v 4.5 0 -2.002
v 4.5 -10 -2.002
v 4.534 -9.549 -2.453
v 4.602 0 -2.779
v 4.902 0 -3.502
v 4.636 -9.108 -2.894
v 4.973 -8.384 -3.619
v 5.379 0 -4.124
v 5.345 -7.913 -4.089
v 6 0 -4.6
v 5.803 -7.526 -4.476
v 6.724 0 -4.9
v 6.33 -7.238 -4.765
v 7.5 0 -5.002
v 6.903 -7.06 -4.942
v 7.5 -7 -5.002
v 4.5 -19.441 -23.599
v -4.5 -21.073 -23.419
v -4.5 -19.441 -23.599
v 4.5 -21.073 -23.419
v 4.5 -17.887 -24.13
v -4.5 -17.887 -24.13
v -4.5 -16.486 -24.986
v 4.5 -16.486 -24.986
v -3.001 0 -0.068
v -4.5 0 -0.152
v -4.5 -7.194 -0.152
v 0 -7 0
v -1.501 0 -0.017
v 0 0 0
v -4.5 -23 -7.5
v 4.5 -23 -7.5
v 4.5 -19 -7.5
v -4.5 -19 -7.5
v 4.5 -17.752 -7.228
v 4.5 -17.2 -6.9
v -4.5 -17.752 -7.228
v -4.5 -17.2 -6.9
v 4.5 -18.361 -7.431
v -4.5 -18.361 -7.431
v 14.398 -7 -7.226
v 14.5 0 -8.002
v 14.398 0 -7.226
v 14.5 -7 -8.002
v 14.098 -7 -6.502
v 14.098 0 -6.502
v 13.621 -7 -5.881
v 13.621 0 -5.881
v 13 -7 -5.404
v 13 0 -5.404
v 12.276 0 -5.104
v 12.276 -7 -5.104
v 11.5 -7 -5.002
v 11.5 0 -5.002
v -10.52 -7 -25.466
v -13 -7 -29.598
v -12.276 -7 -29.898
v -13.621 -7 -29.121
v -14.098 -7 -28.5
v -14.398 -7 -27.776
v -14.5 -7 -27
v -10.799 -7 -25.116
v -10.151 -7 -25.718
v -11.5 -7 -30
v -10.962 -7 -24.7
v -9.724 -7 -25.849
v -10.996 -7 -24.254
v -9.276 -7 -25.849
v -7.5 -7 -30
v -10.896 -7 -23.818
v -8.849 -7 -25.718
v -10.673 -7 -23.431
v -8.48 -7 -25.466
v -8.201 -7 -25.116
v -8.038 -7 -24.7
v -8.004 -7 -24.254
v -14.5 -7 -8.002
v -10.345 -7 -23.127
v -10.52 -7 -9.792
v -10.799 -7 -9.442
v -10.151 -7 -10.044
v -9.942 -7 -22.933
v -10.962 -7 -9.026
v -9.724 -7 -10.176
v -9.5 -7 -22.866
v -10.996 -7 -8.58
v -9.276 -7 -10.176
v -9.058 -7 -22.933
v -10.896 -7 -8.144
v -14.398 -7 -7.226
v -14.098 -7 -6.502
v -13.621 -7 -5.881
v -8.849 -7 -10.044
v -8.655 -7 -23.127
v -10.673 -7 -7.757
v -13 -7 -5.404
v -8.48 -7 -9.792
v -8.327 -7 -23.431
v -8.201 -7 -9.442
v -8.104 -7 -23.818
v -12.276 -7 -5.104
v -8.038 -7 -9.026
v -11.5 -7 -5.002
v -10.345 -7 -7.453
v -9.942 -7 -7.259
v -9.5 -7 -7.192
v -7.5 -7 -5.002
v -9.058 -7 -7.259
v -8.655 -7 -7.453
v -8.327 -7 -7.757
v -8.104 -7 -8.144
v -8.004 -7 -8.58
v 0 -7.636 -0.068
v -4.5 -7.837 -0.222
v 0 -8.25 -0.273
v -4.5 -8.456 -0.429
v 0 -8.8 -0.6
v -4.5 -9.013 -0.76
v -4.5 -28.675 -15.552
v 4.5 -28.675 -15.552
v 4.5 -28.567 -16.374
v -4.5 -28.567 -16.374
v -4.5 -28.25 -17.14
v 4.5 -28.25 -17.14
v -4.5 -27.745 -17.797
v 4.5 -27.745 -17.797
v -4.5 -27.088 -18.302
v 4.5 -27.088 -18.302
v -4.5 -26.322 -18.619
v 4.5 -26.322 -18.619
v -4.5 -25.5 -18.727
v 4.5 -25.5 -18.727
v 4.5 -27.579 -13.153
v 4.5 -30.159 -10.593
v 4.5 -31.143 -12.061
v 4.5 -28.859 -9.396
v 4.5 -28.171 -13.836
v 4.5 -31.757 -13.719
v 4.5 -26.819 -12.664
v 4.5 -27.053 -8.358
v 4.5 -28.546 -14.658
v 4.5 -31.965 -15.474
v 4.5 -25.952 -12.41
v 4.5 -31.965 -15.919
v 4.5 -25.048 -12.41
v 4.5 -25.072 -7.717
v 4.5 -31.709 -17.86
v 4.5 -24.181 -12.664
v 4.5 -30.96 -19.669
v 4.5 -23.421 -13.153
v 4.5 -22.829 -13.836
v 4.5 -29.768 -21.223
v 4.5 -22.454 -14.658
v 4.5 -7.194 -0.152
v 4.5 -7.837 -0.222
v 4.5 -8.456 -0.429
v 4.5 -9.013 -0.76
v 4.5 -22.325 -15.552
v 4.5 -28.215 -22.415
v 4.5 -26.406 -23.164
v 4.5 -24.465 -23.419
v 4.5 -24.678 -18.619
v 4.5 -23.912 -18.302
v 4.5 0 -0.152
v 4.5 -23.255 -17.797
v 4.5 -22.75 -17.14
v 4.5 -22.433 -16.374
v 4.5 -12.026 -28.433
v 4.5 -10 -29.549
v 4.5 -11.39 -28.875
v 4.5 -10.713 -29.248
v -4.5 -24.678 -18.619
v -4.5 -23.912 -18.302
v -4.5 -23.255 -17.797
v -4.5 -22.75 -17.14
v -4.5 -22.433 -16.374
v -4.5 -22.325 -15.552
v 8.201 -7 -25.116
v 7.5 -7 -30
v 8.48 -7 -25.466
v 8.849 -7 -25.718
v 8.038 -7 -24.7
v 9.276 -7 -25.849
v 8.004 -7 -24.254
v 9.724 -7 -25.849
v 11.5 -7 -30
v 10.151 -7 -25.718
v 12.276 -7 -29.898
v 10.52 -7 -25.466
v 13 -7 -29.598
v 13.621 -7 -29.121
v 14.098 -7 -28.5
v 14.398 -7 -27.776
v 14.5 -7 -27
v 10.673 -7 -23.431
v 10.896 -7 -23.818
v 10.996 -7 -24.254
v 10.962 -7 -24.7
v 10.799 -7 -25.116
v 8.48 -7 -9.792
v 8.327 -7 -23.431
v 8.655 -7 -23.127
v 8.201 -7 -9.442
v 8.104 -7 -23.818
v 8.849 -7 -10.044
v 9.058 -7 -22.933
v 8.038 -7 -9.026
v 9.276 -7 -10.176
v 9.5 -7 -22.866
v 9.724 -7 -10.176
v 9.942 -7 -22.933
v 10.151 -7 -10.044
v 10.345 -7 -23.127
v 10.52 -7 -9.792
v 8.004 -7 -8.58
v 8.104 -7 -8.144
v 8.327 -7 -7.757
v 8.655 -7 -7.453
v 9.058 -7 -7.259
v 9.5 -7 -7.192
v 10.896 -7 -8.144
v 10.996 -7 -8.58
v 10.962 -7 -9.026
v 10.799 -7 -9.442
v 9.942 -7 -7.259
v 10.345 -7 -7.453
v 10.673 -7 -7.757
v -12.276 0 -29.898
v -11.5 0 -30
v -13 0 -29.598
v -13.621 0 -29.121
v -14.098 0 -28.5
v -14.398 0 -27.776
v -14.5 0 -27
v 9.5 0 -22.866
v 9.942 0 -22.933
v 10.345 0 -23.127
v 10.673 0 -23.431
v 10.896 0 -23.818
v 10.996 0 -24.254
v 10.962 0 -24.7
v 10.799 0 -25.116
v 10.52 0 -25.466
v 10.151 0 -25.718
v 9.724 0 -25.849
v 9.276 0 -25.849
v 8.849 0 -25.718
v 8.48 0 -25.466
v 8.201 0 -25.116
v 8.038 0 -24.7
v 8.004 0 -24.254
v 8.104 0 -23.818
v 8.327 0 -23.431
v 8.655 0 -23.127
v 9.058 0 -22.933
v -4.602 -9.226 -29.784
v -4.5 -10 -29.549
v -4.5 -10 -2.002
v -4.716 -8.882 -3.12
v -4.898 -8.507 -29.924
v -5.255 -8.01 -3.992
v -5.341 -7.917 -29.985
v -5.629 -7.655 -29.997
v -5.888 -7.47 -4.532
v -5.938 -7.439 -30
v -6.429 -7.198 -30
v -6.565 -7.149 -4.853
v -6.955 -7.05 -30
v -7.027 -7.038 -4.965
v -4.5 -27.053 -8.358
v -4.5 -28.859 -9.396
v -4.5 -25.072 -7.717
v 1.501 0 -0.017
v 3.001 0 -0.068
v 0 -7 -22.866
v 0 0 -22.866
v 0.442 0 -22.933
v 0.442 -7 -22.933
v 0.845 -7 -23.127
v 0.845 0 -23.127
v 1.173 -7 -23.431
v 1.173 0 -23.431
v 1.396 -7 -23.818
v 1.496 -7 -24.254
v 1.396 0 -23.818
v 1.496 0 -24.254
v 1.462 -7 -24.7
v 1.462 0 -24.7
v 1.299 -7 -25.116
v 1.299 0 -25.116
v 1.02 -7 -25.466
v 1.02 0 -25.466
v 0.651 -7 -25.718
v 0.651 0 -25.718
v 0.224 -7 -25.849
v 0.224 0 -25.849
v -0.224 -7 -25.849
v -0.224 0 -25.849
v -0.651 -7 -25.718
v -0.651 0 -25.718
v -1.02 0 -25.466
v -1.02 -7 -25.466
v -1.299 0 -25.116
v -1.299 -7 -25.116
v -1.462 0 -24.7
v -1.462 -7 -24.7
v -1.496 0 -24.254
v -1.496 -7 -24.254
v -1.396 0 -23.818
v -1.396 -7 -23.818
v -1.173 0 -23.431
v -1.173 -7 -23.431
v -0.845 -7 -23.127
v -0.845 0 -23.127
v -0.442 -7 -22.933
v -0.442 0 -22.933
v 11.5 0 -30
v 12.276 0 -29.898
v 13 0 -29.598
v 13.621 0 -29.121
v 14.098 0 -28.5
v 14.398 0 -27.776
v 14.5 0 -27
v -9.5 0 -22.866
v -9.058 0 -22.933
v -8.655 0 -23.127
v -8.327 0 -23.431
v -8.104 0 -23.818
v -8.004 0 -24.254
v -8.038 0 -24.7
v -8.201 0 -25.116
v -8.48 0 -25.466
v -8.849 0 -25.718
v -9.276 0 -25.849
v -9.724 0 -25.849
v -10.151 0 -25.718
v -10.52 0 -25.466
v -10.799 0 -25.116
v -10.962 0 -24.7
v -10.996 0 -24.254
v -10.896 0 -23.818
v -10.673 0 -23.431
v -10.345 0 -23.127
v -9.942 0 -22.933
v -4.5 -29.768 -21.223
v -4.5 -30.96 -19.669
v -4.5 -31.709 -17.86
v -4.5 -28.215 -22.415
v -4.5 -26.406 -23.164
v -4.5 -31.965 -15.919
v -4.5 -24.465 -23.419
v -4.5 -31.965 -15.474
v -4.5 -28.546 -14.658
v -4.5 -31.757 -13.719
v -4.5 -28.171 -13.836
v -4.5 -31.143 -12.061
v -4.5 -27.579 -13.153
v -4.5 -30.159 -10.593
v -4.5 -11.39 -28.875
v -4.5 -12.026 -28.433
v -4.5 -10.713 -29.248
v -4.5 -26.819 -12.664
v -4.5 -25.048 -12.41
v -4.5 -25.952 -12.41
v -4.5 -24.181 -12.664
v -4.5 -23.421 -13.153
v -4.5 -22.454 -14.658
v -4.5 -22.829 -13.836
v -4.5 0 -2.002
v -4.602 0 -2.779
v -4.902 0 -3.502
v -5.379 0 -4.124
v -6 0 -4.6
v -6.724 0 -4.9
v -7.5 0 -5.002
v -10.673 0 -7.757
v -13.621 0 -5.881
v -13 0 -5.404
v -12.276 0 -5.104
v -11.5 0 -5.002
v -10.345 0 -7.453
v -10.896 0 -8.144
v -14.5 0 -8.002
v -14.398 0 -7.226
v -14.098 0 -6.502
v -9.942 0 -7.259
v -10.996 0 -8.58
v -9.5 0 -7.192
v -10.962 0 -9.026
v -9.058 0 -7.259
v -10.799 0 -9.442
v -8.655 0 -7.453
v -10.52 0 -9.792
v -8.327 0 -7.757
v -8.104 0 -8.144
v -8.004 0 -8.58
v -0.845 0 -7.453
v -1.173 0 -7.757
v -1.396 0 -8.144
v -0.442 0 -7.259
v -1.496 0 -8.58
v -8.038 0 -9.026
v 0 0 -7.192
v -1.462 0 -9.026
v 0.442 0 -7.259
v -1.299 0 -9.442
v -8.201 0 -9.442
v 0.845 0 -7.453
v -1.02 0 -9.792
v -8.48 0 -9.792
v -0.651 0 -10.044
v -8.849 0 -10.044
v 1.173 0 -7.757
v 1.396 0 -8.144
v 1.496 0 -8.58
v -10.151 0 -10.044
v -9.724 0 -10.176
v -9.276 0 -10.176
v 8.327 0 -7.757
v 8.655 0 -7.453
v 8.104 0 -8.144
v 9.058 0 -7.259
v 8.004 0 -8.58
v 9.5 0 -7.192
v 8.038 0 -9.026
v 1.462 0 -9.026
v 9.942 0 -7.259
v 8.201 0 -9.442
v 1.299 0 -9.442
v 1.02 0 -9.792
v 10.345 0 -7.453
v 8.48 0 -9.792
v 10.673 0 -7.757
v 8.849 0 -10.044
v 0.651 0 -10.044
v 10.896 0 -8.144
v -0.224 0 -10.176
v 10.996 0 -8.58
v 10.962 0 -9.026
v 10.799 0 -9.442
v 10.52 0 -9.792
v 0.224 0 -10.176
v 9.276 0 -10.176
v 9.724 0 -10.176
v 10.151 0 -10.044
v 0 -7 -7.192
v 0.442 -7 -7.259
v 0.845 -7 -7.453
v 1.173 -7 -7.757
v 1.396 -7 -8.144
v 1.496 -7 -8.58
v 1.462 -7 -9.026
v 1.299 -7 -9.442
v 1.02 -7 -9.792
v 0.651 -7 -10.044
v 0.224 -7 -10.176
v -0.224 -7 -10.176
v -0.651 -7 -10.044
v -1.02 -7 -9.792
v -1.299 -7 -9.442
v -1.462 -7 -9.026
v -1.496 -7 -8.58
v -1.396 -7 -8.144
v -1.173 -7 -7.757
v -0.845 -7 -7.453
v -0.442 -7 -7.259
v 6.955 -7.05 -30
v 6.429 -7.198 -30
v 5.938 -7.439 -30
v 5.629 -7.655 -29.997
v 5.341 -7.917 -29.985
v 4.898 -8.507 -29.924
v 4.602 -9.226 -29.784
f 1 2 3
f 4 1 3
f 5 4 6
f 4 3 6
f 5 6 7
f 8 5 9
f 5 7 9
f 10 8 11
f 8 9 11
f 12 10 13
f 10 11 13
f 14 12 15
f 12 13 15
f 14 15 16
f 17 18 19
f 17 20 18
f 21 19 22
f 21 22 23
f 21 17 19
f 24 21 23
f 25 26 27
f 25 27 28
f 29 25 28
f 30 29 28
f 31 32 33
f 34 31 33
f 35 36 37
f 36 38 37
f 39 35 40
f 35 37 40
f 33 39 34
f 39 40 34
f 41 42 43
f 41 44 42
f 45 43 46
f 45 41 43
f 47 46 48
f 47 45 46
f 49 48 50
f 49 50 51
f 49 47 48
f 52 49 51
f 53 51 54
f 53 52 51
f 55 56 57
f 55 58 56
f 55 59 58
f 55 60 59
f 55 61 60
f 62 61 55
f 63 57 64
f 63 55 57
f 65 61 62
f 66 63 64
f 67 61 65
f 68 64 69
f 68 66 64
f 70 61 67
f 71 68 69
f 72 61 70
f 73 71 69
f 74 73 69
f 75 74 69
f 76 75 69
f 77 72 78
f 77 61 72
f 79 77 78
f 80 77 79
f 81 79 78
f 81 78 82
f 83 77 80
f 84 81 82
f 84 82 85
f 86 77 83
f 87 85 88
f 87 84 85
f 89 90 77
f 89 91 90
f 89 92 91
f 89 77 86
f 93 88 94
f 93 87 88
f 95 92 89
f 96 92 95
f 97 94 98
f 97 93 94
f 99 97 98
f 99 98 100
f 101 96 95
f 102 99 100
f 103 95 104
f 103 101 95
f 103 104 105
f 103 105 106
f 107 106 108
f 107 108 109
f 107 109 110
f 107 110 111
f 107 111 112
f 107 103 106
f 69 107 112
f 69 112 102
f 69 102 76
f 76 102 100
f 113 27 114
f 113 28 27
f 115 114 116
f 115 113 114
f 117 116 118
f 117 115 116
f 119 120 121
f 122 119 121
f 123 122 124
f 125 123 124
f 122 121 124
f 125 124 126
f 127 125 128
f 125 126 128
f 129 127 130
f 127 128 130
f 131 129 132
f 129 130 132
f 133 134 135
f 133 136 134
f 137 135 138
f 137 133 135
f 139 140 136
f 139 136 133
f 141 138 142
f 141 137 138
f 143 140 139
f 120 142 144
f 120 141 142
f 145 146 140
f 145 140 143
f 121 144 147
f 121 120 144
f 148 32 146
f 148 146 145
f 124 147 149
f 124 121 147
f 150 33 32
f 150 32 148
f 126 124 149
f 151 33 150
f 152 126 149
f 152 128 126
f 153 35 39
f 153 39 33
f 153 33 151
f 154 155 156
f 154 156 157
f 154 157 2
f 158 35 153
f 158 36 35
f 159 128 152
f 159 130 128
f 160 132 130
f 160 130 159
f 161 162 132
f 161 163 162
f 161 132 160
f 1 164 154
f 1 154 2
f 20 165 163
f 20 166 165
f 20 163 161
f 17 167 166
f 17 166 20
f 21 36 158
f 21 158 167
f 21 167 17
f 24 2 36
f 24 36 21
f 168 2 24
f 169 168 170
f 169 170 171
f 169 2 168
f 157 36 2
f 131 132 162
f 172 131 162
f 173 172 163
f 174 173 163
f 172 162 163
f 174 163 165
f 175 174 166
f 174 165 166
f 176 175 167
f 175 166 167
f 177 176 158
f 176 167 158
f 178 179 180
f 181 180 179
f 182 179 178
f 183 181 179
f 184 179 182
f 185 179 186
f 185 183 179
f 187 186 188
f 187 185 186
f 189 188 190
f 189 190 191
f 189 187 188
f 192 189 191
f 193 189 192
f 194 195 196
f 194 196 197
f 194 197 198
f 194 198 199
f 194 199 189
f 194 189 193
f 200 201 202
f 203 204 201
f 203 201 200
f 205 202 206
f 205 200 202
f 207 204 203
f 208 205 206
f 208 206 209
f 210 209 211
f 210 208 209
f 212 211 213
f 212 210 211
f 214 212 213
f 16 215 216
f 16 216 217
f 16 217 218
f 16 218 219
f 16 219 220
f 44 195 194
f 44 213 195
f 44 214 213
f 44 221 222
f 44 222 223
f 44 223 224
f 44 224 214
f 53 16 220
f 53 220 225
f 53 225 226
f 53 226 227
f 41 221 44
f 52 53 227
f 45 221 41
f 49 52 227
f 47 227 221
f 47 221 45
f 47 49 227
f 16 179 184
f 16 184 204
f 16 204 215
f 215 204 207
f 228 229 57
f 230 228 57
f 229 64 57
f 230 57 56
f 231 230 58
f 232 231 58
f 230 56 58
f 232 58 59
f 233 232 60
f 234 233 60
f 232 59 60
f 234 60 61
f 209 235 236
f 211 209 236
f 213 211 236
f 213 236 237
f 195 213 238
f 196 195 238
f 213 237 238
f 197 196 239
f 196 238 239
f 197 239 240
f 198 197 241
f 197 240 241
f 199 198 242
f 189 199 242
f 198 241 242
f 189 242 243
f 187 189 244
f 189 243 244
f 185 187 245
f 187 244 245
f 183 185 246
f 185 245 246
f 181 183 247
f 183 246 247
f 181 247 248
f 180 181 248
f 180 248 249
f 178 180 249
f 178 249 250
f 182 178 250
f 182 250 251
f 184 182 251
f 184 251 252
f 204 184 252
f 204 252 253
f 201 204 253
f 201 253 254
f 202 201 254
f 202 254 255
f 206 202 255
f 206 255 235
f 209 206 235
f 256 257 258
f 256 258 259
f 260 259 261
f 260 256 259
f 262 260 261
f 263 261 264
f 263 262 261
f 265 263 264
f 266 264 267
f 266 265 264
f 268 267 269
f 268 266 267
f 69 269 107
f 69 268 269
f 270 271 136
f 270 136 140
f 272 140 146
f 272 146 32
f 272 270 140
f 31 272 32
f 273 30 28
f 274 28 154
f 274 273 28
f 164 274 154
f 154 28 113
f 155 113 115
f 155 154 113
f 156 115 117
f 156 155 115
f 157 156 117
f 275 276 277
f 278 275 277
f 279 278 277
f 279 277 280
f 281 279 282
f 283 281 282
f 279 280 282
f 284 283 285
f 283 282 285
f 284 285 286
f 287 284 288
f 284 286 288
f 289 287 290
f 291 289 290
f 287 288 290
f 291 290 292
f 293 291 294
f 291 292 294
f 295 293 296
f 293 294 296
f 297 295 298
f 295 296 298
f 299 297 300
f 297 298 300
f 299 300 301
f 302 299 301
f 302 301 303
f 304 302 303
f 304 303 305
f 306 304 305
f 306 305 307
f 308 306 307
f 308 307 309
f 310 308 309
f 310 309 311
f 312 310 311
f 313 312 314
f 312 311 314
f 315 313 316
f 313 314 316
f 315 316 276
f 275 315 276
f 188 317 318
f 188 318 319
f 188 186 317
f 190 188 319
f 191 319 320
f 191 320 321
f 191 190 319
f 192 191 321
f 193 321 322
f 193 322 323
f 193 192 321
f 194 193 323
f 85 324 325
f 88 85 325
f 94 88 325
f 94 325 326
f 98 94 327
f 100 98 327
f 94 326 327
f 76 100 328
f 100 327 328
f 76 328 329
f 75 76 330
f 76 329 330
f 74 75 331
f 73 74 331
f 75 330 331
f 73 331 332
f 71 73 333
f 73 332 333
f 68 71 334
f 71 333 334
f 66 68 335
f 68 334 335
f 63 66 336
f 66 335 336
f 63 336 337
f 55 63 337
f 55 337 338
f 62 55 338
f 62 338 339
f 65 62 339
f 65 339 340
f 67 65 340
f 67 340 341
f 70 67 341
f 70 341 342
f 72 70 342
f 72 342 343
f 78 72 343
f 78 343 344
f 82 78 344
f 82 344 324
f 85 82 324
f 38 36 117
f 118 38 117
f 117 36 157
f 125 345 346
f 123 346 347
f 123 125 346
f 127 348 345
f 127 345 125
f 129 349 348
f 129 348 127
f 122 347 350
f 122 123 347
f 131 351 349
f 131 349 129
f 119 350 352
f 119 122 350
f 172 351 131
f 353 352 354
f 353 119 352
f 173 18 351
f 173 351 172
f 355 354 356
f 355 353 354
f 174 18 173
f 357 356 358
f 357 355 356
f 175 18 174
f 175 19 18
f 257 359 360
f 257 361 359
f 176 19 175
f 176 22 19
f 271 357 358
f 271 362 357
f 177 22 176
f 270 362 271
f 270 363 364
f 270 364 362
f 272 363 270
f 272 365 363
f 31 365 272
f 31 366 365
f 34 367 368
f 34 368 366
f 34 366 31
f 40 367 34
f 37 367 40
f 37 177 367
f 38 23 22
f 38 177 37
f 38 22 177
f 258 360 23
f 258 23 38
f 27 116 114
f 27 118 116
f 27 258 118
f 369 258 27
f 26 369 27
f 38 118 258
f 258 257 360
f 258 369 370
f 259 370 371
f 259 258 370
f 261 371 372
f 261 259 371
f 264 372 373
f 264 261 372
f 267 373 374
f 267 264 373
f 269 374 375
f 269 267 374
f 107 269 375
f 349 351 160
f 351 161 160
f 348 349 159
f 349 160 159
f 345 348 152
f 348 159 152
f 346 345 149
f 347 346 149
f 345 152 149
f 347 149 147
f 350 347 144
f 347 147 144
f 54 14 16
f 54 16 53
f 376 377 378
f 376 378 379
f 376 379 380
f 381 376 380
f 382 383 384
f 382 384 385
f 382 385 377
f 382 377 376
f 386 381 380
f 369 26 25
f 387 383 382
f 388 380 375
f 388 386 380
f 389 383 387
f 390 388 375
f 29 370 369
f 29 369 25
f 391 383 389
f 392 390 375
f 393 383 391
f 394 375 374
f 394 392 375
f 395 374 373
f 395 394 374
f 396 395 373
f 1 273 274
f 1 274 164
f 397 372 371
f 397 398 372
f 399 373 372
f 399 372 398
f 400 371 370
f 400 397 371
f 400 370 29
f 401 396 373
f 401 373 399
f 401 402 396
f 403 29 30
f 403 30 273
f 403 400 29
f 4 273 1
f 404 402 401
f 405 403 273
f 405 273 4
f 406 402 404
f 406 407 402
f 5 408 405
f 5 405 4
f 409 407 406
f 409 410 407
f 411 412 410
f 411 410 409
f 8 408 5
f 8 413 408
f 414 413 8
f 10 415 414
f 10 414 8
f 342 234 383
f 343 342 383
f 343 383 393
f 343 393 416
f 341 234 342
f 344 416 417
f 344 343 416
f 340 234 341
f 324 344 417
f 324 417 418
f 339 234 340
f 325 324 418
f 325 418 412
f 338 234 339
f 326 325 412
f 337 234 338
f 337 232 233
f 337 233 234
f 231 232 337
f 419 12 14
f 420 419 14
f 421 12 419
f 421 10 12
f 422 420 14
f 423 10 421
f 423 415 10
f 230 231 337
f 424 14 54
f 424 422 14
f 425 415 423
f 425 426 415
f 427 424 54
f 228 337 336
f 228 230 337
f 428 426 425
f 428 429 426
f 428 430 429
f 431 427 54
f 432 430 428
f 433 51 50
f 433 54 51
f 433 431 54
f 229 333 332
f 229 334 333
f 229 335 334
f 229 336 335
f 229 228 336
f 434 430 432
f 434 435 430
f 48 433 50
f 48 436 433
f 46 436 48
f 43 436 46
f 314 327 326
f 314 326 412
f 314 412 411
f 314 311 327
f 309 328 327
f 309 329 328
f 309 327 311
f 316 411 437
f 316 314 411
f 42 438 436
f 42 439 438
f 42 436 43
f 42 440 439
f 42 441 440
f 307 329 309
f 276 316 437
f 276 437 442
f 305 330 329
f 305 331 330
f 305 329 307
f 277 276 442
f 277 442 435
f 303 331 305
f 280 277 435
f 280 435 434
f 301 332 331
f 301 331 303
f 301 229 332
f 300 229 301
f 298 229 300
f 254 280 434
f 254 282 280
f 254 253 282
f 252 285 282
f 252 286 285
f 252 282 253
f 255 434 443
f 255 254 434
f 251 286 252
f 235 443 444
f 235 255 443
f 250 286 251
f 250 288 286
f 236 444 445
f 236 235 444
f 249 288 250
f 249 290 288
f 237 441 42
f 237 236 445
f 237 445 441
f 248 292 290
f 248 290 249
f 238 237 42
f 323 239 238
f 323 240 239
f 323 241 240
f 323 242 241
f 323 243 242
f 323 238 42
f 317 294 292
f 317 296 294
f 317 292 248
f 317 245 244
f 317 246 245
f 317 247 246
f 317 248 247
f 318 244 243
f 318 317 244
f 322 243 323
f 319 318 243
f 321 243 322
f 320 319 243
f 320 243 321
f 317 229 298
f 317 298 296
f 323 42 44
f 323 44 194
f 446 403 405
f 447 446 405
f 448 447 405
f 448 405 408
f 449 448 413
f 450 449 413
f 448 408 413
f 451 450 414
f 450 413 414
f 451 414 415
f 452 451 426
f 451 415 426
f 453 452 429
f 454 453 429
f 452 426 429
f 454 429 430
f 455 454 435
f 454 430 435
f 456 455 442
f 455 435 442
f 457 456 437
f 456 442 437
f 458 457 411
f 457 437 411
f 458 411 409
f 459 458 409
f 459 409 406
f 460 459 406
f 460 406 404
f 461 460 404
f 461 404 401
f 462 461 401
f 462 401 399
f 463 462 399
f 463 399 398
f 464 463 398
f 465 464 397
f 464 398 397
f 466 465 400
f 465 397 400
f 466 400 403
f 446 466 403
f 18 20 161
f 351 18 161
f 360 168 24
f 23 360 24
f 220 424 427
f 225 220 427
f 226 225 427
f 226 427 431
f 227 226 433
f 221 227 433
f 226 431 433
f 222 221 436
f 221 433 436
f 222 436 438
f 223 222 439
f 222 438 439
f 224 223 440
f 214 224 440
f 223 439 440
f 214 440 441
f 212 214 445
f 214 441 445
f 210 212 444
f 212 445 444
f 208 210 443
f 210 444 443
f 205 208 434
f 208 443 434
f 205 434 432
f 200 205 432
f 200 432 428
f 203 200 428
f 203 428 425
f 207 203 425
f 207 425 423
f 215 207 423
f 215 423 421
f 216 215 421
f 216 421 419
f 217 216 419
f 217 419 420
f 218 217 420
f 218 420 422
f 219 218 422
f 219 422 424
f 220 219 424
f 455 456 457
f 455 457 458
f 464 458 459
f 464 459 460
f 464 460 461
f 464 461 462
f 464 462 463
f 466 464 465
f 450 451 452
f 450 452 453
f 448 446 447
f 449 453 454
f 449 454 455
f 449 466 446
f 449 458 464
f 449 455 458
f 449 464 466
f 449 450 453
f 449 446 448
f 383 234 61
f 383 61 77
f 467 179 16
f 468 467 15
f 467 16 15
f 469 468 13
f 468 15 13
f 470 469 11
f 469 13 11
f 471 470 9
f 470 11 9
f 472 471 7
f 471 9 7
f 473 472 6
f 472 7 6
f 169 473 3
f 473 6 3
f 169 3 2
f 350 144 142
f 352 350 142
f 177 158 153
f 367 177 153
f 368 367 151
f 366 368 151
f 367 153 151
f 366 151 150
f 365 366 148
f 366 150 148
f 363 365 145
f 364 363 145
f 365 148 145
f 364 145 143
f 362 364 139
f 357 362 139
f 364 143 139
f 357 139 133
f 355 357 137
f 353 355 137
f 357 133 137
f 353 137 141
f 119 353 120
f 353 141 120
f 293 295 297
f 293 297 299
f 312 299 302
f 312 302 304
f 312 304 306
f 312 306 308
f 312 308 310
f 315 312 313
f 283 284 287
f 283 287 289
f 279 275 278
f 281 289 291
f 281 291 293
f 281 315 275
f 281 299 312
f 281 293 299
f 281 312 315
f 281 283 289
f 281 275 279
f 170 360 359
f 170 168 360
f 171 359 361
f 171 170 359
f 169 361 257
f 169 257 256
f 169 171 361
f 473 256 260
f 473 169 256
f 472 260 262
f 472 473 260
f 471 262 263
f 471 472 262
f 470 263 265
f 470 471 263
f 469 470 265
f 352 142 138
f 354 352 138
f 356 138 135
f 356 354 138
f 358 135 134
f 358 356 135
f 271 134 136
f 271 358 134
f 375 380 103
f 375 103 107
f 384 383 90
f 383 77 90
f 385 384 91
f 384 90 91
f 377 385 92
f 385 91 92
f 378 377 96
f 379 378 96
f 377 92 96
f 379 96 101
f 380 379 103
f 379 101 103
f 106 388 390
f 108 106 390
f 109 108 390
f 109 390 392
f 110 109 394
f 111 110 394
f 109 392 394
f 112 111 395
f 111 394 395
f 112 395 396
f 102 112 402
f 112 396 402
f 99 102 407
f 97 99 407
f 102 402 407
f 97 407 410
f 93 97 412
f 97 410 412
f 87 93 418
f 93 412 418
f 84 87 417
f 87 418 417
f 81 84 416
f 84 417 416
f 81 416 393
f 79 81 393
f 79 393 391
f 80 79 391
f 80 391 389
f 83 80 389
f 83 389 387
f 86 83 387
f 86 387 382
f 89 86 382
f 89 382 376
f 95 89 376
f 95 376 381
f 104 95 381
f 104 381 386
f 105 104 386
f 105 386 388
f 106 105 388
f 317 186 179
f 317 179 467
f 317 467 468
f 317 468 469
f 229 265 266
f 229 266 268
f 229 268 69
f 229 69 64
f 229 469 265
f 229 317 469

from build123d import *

# Parameters (mm, degrees)
BOSS_EXTRUDE1_DEPTH = 33
SKETCH2_R           = 3.175
CUT_EXTRUDE1_DEPTH  = 20
CUT_EXTRUDE2_DEPTH  = 20
FILLET1_R           = 10
SKETCH3_R           = 1.5
CUT_EXTRUDE3_DEPTH  = 7
SKETCH3_3_R         = 1.5
CUT_EXTRUDE4_DEPTH  = 7
SKETCH3_4_W         = 10
SKETCH3_4_H         = 24.9977367
BOSS_EXTRUDE2_DEPTH = 10
SKETCH3_5_R         = 1.5
CUT_EXTRUDE5_DEPTH  = 8
FILLET9_R           = 3
SKETCH20_W          = 10
SKETCH20_H          = 3
CUT_EXTRUDE6_DEPTH  = 25
FILLET10_R          = 3
FILLET11_R          = 10
FILLET12_R          = 3
FILLET13_R          = 3
CUT_EXTRUDE7_DEPTH  = 5
FILLET17_R          = 7.5
FILLET18_R          = 7.5
FILLET19_R          = 7.5


with BuildPart() as part:
    # Sketch1 → Boss-Extrude1 (new body)
    with BuildSketch(Plane(origin=(0, 0, 0), x_dir=(1, 0, 0), z_dir=(0, 1, 0))):
        with BuildLine():
            ThreePointArc((-4.5, 0.152430338), (0, 0), (4.5, 0.152430338))
            Line((4.5, 0.152430338), (4.5, 30))
            Line((4.5, 30), (-4.5, 30))
            Line((-4.5, 30), (-4.5, 0.152430338))
        make_face()
    extrude(amount=-BOSS_EXTRUDE1_DEPTH)

    # Sketch2 → Cut-Extrude1 (cut)
    with BuildSketch(Plane(origin=(4.5, 0, 0), x_dir=(0, 0, -1), z_dir=(1, 0, 0))):
        with Locations((15.552430338, -25.5)):
            Circle(SKETCH2_R)
    extrude(amount=-CUT_EXTRUDE1_DEPTH, mode=Mode.SUBTRACT)

    # Sketch2<4> → Cut-Extrude2 (cut)
    with BuildSketch(Plane(origin=(4.5, 0, 0), x_dir=(0, 0, -1), z_dir=(1, 0, 0))):
        Polygon((7.5, -33), (7.5, -18), (0, -8), (0, -33), align=None)
    extrude(amount=-CUT_EXTRUDE2_DEPTH, mode=Mode.SUBTRACT)

    # Fillet1
    fillet1_edges = [part.edges().sort_by_distance(p)[0] for p in [
        (0, -33, -7.5),
    ]]
    fillet(fillet1_edges, radius=FILLET1_R)

    # Sketch3 → Cut-Extrude3 (cut)
    with BuildSketch(Plane(origin=(0, 0, 0), x_dir=(1, 0, 0), z_dir=(0, 1, 0))):
        with Locations((0, 24.36613165)):
            Circle(SKETCH3_R)
    extrude(amount=-CUT_EXTRUDE3_DEPTH, mode=Mode.SUBTRACT)

    # Sketch3<3> → Cut-Extrude4 (cut)
    with BuildSketch(Plane(origin=(0, 0, 0), x_dir=(1, 0, 0), z_dir=(0, 1, 0))):
        with Locations((0, 8.6922633)):
            Circle(SKETCH3_3_R)
    extrude(amount=-CUT_EXTRUDE4_DEPTH, mode=Mode.SUBTRACT)

    # Sketch3<4> → Boss-Extrude2 (add)
    with BuildSketch(Plane(origin=(0, 0, 0), x_dir=(1, 0, 0), z_dir=(0, 1, 0))):
        with Locations((9.5, 17.50113165)):
            Rectangle(SKETCH3_4_W, SKETCH3_4_H)
        with Locations((-9.5, 17.50113165)):
            Rectangle(SKETCH3_4_W, SKETCH3_4_H)
    extrude(amount=-BOSS_EXTRUDE2_DEPTH)

    # Sketch3<5> → Cut-Extrude5 (cut)
    with BuildSketch(Plane(origin=(0, 0, 0), x_dir=(1, 0, 0), z_dir=(0, 1, 0))):
        with Locations((-9.5, 24.36613165)):
            Circle(SKETCH3_5_R)
        with Locations((-9.5, 8.6922633)):
            Circle(SKETCH3_5_R)
        with Locations((9.5, 8.6922633)):
            Circle(SKETCH3_5_R)
        with Locations((9.5, 24.36613165)):
            Circle(SKETCH3_5_R)
    extrude(amount=-CUT_EXTRUDE5_DEPTH, mode=Mode.SUBTRACT)

    # Fillet9
    fillet9_edges = [part.edges().sort_by_distance(p)[0] for p in [
        (0, -18, -7.5),
        (-2.253575518, -8.050927935, -0.038195951),
    ]]
    fillet(fillet9_edges, radius=FILLET9_R)

    # Sketch20 → Cut-Extrude6 (cut)
    with BuildSketch(Plane.XY.offset(-5.0022633)):
        with Locations((-9.5, -8.5)):
            Rectangle(SKETCH20_W, SKETCH20_H)
        with Locations((9.5, -8.5)):
            Rectangle(SKETCH20_W, SKETCH20_H)
    extrude(amount=-CUT_EXTRUDE6_DEPTH, mode=Mode.SUBTRACT)

    # Fillet10
    fillet10_edges = [part.edges().sort_by_distance(p)[0] for p in [
        (4.5, -3.5, -5.0022633),
        (-4.5, -3.5, -5.0022633),
    ]]
    fillet(fillet10_edges, radius=FILLET10_R)

    # Fillet11
    fillet11_edges = [part.edges().sort_by_distance(p)[0] for p in [
        (0, -33, -30),
    ]]
    fillet(fillet11_edges, radius=FILLET11_R)

    # Fillet12
    fillet12_edges = [part.edges().sort_by_distance(p)[0] for p in [
        (14.5, -3.5, -30),
        (14.5, -3.5, -5.0022633),
        (-14.5, -3.5, -30),
        (-14.5, -3.5, -5.0022633),
    ]]
    fillet(fillet12_edges, radius=FILLET12_R)

    # Fillet13
    fillet13_edges = [part.edges().sort_by_distance(p)[0] for p in [
        (4.5, -7, -16.00113165),
        (-4.5, -7, -16.00113165),
    ]]
    fillet(fillet13_edges, radius=FILLET13_R)

    # Sketch21 → Cut-Extrude7 (cut, symmetric)
    with BuildSketch(Plane(origin=(0, 0, 0), x_dir=(0, 0, -1), z_dir=(1, 0, 0))):
        Polygon((31.193881394, -10), (30, -10), (23.419344423, -18.511746958), (23.419344423, -31.964785254), (7.776068465, -31.964785254), (7.488922124, -35.386612487), (23.419344423, -35.386612487), (23.419344423, -32.39723809), (31.193881394, -32.39723809), align=None)
    extrude(amount=CUT_EXTRUDE7_DEPTH, both=True, mode=Mode.SUBTRACT)

    # Fillet17
    fillet17_edges = [part.edges().sort_by_distance(p)[0] for p in [
        (0, -31.964785254, -23.419344423),
    ]]
    fillet(fillet17_edges, radius=FILLET17_R)

    # Fillet18
    fillet18_edges = [part.edges().sort_by_distance(p)[0] for p in [
        (0, -31.964785254, -13.069128149),
    ]]
    fillet(fillet18_edges, radius=FILLET18_R)

    # Fillet19
    fillet19_edges = [part.edges().sort_by_distance(p)[0] for p in [
        (0, -10, -30),
        (0, -18.511746958, -23.419344423),
    ]]
    fillet(fillet19_edges, radius=FILLET19_R)


solid = part.part
